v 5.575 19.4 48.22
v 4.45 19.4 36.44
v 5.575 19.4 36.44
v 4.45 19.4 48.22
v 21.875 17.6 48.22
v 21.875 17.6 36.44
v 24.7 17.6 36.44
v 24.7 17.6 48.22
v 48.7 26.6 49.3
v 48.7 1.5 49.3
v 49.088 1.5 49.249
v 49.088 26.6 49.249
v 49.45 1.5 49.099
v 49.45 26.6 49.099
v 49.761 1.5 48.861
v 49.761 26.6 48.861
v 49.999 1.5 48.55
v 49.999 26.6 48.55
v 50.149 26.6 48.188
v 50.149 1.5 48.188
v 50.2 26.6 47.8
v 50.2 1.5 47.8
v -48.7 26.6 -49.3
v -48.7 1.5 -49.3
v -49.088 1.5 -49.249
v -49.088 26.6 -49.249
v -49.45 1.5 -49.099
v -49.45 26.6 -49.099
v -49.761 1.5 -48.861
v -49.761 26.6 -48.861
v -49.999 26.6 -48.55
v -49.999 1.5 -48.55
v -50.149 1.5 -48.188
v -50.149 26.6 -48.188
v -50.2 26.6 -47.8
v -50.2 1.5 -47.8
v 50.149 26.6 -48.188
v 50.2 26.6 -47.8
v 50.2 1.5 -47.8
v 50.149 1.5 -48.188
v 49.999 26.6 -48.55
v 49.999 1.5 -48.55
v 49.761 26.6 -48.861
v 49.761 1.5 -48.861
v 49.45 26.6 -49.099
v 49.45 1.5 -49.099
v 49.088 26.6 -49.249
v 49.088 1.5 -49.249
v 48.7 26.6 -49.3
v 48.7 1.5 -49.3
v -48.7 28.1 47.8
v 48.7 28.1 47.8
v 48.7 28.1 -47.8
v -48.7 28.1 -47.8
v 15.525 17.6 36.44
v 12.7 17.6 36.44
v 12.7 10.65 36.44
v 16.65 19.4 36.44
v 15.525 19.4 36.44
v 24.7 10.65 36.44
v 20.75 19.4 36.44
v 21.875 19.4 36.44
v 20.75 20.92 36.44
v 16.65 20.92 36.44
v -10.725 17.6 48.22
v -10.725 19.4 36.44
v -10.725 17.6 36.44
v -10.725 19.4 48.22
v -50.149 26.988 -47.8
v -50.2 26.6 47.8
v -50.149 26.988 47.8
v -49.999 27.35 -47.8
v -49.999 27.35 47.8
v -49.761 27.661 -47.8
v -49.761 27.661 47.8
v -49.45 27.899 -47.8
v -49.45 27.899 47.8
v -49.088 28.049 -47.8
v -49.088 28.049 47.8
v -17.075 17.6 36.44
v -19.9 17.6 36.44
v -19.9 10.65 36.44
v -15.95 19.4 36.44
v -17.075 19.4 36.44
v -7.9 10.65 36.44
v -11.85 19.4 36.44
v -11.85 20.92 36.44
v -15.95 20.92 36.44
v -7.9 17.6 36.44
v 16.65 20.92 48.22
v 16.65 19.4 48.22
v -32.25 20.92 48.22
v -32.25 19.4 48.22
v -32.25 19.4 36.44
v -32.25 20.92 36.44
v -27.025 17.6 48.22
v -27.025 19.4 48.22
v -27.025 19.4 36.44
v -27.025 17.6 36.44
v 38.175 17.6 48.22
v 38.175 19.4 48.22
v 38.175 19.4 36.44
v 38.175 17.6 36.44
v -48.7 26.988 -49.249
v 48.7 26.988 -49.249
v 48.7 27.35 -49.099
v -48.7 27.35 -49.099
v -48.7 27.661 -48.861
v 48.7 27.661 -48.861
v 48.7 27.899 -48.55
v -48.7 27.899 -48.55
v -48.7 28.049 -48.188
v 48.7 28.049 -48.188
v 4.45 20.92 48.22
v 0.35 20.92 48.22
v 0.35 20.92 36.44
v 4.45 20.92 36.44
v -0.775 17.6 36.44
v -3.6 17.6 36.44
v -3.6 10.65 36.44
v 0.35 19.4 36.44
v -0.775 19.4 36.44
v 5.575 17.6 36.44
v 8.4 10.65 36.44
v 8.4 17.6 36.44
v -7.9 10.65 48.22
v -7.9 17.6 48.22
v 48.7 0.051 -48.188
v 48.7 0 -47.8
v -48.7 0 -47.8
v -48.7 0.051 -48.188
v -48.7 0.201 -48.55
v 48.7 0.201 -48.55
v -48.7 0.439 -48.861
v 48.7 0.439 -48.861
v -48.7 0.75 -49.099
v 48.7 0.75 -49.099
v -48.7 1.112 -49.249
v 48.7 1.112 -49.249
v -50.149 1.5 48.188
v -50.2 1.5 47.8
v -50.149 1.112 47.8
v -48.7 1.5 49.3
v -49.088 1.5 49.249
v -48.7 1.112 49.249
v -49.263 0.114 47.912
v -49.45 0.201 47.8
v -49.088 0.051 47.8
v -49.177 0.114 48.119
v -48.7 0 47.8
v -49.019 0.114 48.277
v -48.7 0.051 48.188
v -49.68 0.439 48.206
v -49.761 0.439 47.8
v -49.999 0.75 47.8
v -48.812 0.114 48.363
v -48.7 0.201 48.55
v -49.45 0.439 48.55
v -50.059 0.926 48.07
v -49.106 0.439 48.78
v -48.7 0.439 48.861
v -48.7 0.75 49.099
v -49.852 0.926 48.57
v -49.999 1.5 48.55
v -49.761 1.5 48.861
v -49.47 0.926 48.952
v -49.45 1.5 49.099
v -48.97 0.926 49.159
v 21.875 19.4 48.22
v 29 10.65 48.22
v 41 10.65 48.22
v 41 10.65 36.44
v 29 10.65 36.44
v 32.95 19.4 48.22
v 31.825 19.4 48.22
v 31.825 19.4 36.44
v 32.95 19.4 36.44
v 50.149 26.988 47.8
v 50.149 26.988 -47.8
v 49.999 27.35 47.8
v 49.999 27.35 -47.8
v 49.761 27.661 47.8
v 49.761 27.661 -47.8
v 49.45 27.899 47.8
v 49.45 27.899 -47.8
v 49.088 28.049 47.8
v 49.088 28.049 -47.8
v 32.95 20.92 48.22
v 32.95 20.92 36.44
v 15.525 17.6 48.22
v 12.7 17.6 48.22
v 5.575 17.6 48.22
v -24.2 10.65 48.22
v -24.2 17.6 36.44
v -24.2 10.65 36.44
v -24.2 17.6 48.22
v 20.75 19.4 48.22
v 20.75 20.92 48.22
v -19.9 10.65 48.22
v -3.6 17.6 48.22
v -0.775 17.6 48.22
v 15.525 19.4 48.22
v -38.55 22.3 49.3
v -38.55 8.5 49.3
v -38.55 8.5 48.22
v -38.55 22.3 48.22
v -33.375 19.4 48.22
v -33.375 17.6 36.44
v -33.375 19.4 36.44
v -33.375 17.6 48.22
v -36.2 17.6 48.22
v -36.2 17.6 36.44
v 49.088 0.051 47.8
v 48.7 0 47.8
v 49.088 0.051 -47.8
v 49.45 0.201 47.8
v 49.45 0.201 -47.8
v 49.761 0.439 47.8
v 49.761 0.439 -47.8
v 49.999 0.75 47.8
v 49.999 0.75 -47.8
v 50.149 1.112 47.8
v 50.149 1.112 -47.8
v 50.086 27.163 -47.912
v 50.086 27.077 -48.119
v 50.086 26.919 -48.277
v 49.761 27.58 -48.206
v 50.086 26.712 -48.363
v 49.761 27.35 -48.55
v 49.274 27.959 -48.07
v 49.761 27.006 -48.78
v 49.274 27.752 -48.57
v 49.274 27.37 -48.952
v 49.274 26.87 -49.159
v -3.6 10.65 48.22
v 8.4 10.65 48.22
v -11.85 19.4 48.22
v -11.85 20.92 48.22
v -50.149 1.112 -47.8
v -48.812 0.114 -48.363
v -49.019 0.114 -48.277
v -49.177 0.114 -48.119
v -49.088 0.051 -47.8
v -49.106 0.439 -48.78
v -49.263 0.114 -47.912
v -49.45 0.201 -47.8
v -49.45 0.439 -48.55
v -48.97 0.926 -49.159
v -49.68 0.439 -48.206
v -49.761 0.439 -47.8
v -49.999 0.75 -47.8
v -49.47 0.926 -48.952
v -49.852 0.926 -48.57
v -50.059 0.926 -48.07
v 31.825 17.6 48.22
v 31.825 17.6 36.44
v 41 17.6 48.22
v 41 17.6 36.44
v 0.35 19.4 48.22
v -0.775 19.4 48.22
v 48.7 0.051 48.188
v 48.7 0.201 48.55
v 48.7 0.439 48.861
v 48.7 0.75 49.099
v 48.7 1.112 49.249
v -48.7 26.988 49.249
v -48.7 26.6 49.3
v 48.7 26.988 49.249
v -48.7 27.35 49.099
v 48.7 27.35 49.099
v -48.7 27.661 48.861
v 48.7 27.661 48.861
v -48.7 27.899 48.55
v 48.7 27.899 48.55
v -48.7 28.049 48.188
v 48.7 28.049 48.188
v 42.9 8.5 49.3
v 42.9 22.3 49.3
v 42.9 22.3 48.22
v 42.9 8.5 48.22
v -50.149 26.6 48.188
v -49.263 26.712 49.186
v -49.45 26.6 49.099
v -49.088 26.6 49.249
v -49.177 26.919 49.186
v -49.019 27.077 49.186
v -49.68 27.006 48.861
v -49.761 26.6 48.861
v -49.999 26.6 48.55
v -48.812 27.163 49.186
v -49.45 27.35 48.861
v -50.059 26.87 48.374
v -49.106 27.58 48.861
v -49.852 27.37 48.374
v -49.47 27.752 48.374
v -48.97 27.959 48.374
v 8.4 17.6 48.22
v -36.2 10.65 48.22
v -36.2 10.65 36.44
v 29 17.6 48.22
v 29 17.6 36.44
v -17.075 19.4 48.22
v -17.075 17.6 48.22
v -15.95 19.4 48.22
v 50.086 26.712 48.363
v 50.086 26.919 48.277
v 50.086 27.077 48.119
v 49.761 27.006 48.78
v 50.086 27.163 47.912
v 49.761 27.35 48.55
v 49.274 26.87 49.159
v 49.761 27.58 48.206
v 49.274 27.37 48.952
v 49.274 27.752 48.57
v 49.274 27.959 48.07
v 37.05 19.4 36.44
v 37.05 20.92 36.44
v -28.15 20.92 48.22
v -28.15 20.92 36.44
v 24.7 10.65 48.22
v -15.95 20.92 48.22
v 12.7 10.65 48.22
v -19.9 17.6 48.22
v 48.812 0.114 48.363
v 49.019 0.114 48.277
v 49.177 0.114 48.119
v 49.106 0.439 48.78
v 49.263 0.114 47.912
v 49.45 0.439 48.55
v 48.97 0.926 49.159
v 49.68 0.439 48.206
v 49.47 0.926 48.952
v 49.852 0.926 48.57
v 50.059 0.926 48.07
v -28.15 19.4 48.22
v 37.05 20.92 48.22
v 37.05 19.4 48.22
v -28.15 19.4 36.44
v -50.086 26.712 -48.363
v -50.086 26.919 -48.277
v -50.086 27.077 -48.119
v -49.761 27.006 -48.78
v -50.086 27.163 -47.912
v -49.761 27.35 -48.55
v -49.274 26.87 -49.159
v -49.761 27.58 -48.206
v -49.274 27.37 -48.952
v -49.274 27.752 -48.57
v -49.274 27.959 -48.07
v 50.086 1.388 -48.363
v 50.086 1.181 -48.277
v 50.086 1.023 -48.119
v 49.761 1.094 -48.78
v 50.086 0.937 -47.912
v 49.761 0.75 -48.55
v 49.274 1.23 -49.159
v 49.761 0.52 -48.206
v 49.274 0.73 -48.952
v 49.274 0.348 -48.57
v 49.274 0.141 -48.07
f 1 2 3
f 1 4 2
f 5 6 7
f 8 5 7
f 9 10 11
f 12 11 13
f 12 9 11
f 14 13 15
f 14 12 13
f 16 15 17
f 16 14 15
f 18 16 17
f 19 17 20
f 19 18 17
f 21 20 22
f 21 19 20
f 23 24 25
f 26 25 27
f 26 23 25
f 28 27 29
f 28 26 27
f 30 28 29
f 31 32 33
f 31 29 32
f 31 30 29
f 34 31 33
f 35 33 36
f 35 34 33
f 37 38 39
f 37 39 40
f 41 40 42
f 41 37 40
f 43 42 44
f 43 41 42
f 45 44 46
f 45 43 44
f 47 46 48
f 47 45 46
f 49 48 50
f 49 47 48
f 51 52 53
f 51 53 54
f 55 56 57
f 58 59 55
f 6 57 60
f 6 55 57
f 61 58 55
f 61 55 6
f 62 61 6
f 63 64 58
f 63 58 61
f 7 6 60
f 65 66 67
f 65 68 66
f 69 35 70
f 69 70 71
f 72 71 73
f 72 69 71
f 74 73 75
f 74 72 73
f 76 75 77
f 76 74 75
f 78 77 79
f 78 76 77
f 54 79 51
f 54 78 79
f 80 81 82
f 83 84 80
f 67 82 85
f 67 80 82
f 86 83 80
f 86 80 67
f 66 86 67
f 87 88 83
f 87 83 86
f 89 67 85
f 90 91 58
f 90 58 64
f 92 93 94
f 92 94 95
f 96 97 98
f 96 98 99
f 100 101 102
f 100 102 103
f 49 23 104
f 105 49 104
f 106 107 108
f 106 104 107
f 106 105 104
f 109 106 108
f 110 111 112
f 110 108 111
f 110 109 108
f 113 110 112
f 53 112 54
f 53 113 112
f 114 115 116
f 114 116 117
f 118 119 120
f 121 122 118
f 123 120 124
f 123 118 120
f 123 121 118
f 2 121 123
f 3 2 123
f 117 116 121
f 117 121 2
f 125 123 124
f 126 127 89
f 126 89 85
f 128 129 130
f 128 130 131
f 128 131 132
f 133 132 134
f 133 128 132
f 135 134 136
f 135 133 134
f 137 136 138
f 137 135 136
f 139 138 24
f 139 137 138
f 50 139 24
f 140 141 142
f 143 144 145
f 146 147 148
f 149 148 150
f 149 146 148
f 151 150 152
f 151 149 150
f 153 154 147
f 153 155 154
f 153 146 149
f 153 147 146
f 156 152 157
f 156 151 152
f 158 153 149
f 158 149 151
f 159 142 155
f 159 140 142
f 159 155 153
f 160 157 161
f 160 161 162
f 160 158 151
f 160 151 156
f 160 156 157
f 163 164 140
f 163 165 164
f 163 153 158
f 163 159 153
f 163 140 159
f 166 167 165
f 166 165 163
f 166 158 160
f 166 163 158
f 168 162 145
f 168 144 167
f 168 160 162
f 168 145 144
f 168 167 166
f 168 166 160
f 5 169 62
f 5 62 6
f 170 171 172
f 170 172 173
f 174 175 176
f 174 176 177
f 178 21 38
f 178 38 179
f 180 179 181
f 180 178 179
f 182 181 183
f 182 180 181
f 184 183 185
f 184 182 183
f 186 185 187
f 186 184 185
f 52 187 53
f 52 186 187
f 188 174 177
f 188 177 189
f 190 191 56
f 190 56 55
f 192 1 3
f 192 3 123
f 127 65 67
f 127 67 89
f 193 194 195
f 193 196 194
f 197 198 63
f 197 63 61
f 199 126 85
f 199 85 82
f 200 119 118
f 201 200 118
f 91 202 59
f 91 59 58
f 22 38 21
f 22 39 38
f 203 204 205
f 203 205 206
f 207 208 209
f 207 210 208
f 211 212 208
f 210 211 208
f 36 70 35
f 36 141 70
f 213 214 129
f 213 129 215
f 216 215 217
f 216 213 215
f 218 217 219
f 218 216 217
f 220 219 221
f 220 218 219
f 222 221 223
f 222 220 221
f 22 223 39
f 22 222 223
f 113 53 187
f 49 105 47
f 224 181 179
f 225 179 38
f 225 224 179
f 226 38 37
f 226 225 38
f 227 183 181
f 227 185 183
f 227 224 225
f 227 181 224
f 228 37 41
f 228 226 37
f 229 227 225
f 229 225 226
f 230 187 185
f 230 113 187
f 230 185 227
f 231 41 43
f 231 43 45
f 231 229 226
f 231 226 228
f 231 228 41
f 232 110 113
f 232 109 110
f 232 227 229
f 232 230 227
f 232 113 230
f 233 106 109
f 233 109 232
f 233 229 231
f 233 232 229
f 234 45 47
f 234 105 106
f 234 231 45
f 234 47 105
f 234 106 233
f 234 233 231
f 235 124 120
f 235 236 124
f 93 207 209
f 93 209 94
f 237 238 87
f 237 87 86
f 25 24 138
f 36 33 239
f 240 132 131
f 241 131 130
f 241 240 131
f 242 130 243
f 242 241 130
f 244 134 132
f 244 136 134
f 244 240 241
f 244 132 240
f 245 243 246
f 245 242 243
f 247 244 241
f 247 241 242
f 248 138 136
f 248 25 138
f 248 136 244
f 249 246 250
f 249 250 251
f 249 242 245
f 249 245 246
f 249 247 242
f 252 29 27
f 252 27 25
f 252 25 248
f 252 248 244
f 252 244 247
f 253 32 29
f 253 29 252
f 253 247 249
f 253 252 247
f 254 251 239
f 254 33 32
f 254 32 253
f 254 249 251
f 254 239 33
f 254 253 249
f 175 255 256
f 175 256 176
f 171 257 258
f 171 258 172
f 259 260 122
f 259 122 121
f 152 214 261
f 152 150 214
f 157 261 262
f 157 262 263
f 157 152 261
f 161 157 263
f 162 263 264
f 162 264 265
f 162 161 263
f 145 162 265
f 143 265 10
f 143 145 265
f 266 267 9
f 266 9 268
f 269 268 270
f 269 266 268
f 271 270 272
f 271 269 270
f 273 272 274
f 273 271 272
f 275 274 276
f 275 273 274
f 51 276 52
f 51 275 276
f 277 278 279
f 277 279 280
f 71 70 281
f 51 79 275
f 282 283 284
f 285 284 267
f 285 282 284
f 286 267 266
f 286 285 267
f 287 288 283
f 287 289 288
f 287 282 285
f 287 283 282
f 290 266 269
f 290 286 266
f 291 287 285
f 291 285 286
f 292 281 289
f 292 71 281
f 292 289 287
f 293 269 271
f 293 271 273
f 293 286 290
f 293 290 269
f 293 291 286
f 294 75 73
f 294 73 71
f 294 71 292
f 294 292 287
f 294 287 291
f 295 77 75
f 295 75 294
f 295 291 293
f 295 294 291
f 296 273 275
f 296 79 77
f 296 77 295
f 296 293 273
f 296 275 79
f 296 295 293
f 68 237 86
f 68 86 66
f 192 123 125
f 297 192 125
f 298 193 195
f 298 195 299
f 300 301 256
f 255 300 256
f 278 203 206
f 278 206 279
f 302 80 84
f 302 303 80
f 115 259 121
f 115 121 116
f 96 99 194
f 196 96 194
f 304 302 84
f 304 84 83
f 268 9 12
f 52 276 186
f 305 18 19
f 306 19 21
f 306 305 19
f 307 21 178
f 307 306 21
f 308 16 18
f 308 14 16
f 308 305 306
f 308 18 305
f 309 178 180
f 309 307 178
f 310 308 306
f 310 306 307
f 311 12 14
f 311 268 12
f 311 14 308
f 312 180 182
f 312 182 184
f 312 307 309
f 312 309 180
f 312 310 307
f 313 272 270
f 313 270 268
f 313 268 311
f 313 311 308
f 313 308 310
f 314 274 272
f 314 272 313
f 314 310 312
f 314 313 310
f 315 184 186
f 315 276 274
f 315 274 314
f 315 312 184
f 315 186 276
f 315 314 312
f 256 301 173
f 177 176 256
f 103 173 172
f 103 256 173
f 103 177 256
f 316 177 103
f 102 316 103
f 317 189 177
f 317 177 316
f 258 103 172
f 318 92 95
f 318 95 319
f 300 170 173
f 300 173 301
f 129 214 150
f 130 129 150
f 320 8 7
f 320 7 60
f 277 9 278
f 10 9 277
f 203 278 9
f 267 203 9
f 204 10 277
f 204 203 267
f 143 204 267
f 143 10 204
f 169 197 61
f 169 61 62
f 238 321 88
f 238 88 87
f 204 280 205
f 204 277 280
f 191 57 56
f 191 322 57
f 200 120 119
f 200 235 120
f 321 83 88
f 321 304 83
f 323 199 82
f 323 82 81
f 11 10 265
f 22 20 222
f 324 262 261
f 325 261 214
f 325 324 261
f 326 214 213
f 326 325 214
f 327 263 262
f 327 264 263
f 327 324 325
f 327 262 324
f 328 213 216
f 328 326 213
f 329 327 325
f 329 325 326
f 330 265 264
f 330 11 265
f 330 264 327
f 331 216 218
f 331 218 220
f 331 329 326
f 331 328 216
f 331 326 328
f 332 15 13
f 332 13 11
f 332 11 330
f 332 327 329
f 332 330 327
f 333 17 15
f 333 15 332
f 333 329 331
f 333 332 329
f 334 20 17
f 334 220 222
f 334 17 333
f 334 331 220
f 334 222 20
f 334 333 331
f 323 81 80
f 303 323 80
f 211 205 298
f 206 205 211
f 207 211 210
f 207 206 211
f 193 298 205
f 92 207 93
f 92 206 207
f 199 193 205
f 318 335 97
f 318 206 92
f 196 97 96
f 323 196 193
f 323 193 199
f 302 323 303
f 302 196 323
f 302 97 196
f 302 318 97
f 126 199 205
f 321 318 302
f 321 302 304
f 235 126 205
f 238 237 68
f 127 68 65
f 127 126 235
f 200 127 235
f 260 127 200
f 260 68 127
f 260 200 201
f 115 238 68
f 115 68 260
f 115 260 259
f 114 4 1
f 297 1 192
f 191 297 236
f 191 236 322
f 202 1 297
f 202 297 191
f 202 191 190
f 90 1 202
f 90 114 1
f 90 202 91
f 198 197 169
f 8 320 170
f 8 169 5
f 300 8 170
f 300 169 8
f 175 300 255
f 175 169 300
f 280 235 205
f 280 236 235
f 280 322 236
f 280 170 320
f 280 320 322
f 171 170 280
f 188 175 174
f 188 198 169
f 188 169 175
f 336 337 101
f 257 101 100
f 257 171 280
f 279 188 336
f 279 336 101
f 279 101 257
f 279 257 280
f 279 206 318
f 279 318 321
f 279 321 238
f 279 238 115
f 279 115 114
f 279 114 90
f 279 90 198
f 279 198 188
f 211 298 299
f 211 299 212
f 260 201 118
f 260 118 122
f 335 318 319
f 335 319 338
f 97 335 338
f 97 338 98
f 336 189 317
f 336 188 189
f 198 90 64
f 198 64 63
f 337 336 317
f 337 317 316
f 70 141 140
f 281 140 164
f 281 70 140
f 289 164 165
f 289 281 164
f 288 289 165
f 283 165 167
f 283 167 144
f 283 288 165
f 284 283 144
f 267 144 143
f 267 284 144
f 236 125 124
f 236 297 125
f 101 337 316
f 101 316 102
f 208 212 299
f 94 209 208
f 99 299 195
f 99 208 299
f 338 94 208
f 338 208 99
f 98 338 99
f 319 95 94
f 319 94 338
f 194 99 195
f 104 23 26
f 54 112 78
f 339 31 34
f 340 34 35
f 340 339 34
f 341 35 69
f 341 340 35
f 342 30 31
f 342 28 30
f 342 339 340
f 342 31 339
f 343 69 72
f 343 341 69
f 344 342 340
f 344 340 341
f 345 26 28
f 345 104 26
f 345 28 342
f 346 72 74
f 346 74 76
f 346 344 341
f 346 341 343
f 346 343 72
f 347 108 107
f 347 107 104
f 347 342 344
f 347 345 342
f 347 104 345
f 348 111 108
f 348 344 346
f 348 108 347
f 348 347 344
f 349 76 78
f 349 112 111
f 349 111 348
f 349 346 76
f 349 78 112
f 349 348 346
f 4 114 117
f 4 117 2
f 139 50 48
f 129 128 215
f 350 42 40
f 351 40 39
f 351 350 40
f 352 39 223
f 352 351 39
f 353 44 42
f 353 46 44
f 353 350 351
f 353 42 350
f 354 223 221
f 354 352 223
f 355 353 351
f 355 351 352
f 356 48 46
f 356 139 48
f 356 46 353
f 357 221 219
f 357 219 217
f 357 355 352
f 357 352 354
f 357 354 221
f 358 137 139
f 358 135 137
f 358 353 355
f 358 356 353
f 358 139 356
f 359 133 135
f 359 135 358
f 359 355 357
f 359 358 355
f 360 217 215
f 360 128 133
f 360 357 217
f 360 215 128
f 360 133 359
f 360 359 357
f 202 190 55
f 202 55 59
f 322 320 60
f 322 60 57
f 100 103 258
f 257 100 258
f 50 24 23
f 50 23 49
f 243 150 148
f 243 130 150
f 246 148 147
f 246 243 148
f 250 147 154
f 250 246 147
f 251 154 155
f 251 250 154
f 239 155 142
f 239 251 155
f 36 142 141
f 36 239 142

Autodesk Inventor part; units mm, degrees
ref_plane "YZ Plane" through (0, 0, 0) normal (1, 0, 0) x (0, 1, 0)
ref_plane "XZ Plane" through (0, 0, 0) normal (0, 1, 0) x (-1, 0, 0)
ref_plane "XY Plane" through (0, 0, 0) normal (0, 0, 1) x (1, 0, 0)
sketch "Sketch1" plane through (0, 0, 0) normal (0, 1, 0) x (-1, 0, 0)
  line L0 (50.2, -49.3) -> (-50.2, -49.3)
  line L1 (-50.2, -49.3) -> (-50.2, 49.3)
  line L2 (-50.2, 49.3) -> (50.2, 49.3)
  line L3 (50.2, 49.3) -> (50.2, -49.3)
  point P0 (0, 0)
  dimension "d0" = 100.4
  dimension "d1" = 98.6
  dimension "d2" = 49.3
  dimension "d3" = 50.2
extrude "Extrusion1" add sketch "Sketch1" along normal blind 28.1
sketch "Sketch2" plane through (-50.2, 0, 49.3) normal (0, 0, 1) x (1, 0, 0)
  line L0 (11.65, 22.3) -> (93.1, 22.3)
  line L1 (93.1, 22.3) -> (93.1, 8.5)
  line L2 (93.1, 8.5) -> (11.65, 8.5)
  line L3 (11.65, 8.5) -> (11.65, 22.3)
  line L4 (100.4, 0) -> (100.4, 28.1) projected
  line L5 (0, 0) -> (0, 28.1) projected
  line L6 (0, 28.1) -> (100.4, 28.1) projected
  line L7 (0, 0) -> (100.4, 0) projected
  point P0 (50.2, 0)
  point P1 (100.4, 14.05)
  dimension "d6" = 7.3
  dimension "d7" = 11.65
  dimension "d8" = 5.8
  dimension "d9" = 8.5
extrude "Extrusion2" cut sketch "Sketch2" against normal blind 1.08 contours L0 L1 L2 L3
sketch "Sketch3" plane through (-50.2, 0, 48.22) normal (0, 0, 1) x (1, 0, 0)
  line L0 (14, 17.6) -> (26, 17.6)
  line L1 (26, 17.6) -> (26, 10.65)
  line L2 (26, 10.65) -> (14, 10.65)
  line L3 (14, 10.65) -> (14, 17.6)
  line L4 (16.825, 19.4) -> (23.175, 19.4)
  line L5 (23.175, 19.4) -> (23.175, 17.6)
  line L6 (23.175, 17.6) -> (16.825, 17.6)
  line L7 (16.825, 17.6) -> (16.825, 19.4)
  line L8 (17.95, 20.92) -> (22.05, 20.92)
  line L9 (22.05, 20.92) -> (22.05, 19.4)
  line L10 (22.05, 19.4) -> (17.95, 19.4)
  line L11 (17.95, 19.4) -> (17.95, 20.92)
  line L12 (93.1, 8.5) -> (11.65, 8.5) projected
  line L13 (11.65, 8.5) -> (11.65, 22.3) projected
  point P0 (50.2, 0)
  point P1 (17.95, 19.4)
  dimension "d12" = 12
  dimension "d13" = 6.35
  dimension "d14" = 4.1
  dimension "d15" = 2.825
  dimension "d16" = 2.825
  dimension "d17" = 1.125
  dimension "d18" = 1.125
  dimension "d19" = 6.95
  dimension "d20" = 1.8
  dimension "d21" = 1.52
  dimension "d22" = 2.15
  dimension "d23" = 2.35
extrude "Extrusion3" cut sketch "Sketch3" against normal blind 11.78
pattern_linear "Rectangular Pattern1" count 5 spacing 16.3 along (1, 0, 0) of "Extrusion3"
fillet "Fillet1" radius 1.5 12 edges at (0, 28.1, -49.3) (-50.2, 28.1, 0) (0, 28.1, 49.3) (50.2, 28.1, 0) (50.2, 14.05, 49.3) (-50.2, 14.05, 49.3) (-50.2, 14.05, -49.3) (-50.2, 0, 0) (0, 0, -49.3) (50.2, 14.05, -49.3) (50.2, 0, 0) (0, 0, 49.3)
equation "\"d2\" = 0.5 * d1"
equation "\"d3\" = 0.5 * d0"
properties part number "5-port-switch"
